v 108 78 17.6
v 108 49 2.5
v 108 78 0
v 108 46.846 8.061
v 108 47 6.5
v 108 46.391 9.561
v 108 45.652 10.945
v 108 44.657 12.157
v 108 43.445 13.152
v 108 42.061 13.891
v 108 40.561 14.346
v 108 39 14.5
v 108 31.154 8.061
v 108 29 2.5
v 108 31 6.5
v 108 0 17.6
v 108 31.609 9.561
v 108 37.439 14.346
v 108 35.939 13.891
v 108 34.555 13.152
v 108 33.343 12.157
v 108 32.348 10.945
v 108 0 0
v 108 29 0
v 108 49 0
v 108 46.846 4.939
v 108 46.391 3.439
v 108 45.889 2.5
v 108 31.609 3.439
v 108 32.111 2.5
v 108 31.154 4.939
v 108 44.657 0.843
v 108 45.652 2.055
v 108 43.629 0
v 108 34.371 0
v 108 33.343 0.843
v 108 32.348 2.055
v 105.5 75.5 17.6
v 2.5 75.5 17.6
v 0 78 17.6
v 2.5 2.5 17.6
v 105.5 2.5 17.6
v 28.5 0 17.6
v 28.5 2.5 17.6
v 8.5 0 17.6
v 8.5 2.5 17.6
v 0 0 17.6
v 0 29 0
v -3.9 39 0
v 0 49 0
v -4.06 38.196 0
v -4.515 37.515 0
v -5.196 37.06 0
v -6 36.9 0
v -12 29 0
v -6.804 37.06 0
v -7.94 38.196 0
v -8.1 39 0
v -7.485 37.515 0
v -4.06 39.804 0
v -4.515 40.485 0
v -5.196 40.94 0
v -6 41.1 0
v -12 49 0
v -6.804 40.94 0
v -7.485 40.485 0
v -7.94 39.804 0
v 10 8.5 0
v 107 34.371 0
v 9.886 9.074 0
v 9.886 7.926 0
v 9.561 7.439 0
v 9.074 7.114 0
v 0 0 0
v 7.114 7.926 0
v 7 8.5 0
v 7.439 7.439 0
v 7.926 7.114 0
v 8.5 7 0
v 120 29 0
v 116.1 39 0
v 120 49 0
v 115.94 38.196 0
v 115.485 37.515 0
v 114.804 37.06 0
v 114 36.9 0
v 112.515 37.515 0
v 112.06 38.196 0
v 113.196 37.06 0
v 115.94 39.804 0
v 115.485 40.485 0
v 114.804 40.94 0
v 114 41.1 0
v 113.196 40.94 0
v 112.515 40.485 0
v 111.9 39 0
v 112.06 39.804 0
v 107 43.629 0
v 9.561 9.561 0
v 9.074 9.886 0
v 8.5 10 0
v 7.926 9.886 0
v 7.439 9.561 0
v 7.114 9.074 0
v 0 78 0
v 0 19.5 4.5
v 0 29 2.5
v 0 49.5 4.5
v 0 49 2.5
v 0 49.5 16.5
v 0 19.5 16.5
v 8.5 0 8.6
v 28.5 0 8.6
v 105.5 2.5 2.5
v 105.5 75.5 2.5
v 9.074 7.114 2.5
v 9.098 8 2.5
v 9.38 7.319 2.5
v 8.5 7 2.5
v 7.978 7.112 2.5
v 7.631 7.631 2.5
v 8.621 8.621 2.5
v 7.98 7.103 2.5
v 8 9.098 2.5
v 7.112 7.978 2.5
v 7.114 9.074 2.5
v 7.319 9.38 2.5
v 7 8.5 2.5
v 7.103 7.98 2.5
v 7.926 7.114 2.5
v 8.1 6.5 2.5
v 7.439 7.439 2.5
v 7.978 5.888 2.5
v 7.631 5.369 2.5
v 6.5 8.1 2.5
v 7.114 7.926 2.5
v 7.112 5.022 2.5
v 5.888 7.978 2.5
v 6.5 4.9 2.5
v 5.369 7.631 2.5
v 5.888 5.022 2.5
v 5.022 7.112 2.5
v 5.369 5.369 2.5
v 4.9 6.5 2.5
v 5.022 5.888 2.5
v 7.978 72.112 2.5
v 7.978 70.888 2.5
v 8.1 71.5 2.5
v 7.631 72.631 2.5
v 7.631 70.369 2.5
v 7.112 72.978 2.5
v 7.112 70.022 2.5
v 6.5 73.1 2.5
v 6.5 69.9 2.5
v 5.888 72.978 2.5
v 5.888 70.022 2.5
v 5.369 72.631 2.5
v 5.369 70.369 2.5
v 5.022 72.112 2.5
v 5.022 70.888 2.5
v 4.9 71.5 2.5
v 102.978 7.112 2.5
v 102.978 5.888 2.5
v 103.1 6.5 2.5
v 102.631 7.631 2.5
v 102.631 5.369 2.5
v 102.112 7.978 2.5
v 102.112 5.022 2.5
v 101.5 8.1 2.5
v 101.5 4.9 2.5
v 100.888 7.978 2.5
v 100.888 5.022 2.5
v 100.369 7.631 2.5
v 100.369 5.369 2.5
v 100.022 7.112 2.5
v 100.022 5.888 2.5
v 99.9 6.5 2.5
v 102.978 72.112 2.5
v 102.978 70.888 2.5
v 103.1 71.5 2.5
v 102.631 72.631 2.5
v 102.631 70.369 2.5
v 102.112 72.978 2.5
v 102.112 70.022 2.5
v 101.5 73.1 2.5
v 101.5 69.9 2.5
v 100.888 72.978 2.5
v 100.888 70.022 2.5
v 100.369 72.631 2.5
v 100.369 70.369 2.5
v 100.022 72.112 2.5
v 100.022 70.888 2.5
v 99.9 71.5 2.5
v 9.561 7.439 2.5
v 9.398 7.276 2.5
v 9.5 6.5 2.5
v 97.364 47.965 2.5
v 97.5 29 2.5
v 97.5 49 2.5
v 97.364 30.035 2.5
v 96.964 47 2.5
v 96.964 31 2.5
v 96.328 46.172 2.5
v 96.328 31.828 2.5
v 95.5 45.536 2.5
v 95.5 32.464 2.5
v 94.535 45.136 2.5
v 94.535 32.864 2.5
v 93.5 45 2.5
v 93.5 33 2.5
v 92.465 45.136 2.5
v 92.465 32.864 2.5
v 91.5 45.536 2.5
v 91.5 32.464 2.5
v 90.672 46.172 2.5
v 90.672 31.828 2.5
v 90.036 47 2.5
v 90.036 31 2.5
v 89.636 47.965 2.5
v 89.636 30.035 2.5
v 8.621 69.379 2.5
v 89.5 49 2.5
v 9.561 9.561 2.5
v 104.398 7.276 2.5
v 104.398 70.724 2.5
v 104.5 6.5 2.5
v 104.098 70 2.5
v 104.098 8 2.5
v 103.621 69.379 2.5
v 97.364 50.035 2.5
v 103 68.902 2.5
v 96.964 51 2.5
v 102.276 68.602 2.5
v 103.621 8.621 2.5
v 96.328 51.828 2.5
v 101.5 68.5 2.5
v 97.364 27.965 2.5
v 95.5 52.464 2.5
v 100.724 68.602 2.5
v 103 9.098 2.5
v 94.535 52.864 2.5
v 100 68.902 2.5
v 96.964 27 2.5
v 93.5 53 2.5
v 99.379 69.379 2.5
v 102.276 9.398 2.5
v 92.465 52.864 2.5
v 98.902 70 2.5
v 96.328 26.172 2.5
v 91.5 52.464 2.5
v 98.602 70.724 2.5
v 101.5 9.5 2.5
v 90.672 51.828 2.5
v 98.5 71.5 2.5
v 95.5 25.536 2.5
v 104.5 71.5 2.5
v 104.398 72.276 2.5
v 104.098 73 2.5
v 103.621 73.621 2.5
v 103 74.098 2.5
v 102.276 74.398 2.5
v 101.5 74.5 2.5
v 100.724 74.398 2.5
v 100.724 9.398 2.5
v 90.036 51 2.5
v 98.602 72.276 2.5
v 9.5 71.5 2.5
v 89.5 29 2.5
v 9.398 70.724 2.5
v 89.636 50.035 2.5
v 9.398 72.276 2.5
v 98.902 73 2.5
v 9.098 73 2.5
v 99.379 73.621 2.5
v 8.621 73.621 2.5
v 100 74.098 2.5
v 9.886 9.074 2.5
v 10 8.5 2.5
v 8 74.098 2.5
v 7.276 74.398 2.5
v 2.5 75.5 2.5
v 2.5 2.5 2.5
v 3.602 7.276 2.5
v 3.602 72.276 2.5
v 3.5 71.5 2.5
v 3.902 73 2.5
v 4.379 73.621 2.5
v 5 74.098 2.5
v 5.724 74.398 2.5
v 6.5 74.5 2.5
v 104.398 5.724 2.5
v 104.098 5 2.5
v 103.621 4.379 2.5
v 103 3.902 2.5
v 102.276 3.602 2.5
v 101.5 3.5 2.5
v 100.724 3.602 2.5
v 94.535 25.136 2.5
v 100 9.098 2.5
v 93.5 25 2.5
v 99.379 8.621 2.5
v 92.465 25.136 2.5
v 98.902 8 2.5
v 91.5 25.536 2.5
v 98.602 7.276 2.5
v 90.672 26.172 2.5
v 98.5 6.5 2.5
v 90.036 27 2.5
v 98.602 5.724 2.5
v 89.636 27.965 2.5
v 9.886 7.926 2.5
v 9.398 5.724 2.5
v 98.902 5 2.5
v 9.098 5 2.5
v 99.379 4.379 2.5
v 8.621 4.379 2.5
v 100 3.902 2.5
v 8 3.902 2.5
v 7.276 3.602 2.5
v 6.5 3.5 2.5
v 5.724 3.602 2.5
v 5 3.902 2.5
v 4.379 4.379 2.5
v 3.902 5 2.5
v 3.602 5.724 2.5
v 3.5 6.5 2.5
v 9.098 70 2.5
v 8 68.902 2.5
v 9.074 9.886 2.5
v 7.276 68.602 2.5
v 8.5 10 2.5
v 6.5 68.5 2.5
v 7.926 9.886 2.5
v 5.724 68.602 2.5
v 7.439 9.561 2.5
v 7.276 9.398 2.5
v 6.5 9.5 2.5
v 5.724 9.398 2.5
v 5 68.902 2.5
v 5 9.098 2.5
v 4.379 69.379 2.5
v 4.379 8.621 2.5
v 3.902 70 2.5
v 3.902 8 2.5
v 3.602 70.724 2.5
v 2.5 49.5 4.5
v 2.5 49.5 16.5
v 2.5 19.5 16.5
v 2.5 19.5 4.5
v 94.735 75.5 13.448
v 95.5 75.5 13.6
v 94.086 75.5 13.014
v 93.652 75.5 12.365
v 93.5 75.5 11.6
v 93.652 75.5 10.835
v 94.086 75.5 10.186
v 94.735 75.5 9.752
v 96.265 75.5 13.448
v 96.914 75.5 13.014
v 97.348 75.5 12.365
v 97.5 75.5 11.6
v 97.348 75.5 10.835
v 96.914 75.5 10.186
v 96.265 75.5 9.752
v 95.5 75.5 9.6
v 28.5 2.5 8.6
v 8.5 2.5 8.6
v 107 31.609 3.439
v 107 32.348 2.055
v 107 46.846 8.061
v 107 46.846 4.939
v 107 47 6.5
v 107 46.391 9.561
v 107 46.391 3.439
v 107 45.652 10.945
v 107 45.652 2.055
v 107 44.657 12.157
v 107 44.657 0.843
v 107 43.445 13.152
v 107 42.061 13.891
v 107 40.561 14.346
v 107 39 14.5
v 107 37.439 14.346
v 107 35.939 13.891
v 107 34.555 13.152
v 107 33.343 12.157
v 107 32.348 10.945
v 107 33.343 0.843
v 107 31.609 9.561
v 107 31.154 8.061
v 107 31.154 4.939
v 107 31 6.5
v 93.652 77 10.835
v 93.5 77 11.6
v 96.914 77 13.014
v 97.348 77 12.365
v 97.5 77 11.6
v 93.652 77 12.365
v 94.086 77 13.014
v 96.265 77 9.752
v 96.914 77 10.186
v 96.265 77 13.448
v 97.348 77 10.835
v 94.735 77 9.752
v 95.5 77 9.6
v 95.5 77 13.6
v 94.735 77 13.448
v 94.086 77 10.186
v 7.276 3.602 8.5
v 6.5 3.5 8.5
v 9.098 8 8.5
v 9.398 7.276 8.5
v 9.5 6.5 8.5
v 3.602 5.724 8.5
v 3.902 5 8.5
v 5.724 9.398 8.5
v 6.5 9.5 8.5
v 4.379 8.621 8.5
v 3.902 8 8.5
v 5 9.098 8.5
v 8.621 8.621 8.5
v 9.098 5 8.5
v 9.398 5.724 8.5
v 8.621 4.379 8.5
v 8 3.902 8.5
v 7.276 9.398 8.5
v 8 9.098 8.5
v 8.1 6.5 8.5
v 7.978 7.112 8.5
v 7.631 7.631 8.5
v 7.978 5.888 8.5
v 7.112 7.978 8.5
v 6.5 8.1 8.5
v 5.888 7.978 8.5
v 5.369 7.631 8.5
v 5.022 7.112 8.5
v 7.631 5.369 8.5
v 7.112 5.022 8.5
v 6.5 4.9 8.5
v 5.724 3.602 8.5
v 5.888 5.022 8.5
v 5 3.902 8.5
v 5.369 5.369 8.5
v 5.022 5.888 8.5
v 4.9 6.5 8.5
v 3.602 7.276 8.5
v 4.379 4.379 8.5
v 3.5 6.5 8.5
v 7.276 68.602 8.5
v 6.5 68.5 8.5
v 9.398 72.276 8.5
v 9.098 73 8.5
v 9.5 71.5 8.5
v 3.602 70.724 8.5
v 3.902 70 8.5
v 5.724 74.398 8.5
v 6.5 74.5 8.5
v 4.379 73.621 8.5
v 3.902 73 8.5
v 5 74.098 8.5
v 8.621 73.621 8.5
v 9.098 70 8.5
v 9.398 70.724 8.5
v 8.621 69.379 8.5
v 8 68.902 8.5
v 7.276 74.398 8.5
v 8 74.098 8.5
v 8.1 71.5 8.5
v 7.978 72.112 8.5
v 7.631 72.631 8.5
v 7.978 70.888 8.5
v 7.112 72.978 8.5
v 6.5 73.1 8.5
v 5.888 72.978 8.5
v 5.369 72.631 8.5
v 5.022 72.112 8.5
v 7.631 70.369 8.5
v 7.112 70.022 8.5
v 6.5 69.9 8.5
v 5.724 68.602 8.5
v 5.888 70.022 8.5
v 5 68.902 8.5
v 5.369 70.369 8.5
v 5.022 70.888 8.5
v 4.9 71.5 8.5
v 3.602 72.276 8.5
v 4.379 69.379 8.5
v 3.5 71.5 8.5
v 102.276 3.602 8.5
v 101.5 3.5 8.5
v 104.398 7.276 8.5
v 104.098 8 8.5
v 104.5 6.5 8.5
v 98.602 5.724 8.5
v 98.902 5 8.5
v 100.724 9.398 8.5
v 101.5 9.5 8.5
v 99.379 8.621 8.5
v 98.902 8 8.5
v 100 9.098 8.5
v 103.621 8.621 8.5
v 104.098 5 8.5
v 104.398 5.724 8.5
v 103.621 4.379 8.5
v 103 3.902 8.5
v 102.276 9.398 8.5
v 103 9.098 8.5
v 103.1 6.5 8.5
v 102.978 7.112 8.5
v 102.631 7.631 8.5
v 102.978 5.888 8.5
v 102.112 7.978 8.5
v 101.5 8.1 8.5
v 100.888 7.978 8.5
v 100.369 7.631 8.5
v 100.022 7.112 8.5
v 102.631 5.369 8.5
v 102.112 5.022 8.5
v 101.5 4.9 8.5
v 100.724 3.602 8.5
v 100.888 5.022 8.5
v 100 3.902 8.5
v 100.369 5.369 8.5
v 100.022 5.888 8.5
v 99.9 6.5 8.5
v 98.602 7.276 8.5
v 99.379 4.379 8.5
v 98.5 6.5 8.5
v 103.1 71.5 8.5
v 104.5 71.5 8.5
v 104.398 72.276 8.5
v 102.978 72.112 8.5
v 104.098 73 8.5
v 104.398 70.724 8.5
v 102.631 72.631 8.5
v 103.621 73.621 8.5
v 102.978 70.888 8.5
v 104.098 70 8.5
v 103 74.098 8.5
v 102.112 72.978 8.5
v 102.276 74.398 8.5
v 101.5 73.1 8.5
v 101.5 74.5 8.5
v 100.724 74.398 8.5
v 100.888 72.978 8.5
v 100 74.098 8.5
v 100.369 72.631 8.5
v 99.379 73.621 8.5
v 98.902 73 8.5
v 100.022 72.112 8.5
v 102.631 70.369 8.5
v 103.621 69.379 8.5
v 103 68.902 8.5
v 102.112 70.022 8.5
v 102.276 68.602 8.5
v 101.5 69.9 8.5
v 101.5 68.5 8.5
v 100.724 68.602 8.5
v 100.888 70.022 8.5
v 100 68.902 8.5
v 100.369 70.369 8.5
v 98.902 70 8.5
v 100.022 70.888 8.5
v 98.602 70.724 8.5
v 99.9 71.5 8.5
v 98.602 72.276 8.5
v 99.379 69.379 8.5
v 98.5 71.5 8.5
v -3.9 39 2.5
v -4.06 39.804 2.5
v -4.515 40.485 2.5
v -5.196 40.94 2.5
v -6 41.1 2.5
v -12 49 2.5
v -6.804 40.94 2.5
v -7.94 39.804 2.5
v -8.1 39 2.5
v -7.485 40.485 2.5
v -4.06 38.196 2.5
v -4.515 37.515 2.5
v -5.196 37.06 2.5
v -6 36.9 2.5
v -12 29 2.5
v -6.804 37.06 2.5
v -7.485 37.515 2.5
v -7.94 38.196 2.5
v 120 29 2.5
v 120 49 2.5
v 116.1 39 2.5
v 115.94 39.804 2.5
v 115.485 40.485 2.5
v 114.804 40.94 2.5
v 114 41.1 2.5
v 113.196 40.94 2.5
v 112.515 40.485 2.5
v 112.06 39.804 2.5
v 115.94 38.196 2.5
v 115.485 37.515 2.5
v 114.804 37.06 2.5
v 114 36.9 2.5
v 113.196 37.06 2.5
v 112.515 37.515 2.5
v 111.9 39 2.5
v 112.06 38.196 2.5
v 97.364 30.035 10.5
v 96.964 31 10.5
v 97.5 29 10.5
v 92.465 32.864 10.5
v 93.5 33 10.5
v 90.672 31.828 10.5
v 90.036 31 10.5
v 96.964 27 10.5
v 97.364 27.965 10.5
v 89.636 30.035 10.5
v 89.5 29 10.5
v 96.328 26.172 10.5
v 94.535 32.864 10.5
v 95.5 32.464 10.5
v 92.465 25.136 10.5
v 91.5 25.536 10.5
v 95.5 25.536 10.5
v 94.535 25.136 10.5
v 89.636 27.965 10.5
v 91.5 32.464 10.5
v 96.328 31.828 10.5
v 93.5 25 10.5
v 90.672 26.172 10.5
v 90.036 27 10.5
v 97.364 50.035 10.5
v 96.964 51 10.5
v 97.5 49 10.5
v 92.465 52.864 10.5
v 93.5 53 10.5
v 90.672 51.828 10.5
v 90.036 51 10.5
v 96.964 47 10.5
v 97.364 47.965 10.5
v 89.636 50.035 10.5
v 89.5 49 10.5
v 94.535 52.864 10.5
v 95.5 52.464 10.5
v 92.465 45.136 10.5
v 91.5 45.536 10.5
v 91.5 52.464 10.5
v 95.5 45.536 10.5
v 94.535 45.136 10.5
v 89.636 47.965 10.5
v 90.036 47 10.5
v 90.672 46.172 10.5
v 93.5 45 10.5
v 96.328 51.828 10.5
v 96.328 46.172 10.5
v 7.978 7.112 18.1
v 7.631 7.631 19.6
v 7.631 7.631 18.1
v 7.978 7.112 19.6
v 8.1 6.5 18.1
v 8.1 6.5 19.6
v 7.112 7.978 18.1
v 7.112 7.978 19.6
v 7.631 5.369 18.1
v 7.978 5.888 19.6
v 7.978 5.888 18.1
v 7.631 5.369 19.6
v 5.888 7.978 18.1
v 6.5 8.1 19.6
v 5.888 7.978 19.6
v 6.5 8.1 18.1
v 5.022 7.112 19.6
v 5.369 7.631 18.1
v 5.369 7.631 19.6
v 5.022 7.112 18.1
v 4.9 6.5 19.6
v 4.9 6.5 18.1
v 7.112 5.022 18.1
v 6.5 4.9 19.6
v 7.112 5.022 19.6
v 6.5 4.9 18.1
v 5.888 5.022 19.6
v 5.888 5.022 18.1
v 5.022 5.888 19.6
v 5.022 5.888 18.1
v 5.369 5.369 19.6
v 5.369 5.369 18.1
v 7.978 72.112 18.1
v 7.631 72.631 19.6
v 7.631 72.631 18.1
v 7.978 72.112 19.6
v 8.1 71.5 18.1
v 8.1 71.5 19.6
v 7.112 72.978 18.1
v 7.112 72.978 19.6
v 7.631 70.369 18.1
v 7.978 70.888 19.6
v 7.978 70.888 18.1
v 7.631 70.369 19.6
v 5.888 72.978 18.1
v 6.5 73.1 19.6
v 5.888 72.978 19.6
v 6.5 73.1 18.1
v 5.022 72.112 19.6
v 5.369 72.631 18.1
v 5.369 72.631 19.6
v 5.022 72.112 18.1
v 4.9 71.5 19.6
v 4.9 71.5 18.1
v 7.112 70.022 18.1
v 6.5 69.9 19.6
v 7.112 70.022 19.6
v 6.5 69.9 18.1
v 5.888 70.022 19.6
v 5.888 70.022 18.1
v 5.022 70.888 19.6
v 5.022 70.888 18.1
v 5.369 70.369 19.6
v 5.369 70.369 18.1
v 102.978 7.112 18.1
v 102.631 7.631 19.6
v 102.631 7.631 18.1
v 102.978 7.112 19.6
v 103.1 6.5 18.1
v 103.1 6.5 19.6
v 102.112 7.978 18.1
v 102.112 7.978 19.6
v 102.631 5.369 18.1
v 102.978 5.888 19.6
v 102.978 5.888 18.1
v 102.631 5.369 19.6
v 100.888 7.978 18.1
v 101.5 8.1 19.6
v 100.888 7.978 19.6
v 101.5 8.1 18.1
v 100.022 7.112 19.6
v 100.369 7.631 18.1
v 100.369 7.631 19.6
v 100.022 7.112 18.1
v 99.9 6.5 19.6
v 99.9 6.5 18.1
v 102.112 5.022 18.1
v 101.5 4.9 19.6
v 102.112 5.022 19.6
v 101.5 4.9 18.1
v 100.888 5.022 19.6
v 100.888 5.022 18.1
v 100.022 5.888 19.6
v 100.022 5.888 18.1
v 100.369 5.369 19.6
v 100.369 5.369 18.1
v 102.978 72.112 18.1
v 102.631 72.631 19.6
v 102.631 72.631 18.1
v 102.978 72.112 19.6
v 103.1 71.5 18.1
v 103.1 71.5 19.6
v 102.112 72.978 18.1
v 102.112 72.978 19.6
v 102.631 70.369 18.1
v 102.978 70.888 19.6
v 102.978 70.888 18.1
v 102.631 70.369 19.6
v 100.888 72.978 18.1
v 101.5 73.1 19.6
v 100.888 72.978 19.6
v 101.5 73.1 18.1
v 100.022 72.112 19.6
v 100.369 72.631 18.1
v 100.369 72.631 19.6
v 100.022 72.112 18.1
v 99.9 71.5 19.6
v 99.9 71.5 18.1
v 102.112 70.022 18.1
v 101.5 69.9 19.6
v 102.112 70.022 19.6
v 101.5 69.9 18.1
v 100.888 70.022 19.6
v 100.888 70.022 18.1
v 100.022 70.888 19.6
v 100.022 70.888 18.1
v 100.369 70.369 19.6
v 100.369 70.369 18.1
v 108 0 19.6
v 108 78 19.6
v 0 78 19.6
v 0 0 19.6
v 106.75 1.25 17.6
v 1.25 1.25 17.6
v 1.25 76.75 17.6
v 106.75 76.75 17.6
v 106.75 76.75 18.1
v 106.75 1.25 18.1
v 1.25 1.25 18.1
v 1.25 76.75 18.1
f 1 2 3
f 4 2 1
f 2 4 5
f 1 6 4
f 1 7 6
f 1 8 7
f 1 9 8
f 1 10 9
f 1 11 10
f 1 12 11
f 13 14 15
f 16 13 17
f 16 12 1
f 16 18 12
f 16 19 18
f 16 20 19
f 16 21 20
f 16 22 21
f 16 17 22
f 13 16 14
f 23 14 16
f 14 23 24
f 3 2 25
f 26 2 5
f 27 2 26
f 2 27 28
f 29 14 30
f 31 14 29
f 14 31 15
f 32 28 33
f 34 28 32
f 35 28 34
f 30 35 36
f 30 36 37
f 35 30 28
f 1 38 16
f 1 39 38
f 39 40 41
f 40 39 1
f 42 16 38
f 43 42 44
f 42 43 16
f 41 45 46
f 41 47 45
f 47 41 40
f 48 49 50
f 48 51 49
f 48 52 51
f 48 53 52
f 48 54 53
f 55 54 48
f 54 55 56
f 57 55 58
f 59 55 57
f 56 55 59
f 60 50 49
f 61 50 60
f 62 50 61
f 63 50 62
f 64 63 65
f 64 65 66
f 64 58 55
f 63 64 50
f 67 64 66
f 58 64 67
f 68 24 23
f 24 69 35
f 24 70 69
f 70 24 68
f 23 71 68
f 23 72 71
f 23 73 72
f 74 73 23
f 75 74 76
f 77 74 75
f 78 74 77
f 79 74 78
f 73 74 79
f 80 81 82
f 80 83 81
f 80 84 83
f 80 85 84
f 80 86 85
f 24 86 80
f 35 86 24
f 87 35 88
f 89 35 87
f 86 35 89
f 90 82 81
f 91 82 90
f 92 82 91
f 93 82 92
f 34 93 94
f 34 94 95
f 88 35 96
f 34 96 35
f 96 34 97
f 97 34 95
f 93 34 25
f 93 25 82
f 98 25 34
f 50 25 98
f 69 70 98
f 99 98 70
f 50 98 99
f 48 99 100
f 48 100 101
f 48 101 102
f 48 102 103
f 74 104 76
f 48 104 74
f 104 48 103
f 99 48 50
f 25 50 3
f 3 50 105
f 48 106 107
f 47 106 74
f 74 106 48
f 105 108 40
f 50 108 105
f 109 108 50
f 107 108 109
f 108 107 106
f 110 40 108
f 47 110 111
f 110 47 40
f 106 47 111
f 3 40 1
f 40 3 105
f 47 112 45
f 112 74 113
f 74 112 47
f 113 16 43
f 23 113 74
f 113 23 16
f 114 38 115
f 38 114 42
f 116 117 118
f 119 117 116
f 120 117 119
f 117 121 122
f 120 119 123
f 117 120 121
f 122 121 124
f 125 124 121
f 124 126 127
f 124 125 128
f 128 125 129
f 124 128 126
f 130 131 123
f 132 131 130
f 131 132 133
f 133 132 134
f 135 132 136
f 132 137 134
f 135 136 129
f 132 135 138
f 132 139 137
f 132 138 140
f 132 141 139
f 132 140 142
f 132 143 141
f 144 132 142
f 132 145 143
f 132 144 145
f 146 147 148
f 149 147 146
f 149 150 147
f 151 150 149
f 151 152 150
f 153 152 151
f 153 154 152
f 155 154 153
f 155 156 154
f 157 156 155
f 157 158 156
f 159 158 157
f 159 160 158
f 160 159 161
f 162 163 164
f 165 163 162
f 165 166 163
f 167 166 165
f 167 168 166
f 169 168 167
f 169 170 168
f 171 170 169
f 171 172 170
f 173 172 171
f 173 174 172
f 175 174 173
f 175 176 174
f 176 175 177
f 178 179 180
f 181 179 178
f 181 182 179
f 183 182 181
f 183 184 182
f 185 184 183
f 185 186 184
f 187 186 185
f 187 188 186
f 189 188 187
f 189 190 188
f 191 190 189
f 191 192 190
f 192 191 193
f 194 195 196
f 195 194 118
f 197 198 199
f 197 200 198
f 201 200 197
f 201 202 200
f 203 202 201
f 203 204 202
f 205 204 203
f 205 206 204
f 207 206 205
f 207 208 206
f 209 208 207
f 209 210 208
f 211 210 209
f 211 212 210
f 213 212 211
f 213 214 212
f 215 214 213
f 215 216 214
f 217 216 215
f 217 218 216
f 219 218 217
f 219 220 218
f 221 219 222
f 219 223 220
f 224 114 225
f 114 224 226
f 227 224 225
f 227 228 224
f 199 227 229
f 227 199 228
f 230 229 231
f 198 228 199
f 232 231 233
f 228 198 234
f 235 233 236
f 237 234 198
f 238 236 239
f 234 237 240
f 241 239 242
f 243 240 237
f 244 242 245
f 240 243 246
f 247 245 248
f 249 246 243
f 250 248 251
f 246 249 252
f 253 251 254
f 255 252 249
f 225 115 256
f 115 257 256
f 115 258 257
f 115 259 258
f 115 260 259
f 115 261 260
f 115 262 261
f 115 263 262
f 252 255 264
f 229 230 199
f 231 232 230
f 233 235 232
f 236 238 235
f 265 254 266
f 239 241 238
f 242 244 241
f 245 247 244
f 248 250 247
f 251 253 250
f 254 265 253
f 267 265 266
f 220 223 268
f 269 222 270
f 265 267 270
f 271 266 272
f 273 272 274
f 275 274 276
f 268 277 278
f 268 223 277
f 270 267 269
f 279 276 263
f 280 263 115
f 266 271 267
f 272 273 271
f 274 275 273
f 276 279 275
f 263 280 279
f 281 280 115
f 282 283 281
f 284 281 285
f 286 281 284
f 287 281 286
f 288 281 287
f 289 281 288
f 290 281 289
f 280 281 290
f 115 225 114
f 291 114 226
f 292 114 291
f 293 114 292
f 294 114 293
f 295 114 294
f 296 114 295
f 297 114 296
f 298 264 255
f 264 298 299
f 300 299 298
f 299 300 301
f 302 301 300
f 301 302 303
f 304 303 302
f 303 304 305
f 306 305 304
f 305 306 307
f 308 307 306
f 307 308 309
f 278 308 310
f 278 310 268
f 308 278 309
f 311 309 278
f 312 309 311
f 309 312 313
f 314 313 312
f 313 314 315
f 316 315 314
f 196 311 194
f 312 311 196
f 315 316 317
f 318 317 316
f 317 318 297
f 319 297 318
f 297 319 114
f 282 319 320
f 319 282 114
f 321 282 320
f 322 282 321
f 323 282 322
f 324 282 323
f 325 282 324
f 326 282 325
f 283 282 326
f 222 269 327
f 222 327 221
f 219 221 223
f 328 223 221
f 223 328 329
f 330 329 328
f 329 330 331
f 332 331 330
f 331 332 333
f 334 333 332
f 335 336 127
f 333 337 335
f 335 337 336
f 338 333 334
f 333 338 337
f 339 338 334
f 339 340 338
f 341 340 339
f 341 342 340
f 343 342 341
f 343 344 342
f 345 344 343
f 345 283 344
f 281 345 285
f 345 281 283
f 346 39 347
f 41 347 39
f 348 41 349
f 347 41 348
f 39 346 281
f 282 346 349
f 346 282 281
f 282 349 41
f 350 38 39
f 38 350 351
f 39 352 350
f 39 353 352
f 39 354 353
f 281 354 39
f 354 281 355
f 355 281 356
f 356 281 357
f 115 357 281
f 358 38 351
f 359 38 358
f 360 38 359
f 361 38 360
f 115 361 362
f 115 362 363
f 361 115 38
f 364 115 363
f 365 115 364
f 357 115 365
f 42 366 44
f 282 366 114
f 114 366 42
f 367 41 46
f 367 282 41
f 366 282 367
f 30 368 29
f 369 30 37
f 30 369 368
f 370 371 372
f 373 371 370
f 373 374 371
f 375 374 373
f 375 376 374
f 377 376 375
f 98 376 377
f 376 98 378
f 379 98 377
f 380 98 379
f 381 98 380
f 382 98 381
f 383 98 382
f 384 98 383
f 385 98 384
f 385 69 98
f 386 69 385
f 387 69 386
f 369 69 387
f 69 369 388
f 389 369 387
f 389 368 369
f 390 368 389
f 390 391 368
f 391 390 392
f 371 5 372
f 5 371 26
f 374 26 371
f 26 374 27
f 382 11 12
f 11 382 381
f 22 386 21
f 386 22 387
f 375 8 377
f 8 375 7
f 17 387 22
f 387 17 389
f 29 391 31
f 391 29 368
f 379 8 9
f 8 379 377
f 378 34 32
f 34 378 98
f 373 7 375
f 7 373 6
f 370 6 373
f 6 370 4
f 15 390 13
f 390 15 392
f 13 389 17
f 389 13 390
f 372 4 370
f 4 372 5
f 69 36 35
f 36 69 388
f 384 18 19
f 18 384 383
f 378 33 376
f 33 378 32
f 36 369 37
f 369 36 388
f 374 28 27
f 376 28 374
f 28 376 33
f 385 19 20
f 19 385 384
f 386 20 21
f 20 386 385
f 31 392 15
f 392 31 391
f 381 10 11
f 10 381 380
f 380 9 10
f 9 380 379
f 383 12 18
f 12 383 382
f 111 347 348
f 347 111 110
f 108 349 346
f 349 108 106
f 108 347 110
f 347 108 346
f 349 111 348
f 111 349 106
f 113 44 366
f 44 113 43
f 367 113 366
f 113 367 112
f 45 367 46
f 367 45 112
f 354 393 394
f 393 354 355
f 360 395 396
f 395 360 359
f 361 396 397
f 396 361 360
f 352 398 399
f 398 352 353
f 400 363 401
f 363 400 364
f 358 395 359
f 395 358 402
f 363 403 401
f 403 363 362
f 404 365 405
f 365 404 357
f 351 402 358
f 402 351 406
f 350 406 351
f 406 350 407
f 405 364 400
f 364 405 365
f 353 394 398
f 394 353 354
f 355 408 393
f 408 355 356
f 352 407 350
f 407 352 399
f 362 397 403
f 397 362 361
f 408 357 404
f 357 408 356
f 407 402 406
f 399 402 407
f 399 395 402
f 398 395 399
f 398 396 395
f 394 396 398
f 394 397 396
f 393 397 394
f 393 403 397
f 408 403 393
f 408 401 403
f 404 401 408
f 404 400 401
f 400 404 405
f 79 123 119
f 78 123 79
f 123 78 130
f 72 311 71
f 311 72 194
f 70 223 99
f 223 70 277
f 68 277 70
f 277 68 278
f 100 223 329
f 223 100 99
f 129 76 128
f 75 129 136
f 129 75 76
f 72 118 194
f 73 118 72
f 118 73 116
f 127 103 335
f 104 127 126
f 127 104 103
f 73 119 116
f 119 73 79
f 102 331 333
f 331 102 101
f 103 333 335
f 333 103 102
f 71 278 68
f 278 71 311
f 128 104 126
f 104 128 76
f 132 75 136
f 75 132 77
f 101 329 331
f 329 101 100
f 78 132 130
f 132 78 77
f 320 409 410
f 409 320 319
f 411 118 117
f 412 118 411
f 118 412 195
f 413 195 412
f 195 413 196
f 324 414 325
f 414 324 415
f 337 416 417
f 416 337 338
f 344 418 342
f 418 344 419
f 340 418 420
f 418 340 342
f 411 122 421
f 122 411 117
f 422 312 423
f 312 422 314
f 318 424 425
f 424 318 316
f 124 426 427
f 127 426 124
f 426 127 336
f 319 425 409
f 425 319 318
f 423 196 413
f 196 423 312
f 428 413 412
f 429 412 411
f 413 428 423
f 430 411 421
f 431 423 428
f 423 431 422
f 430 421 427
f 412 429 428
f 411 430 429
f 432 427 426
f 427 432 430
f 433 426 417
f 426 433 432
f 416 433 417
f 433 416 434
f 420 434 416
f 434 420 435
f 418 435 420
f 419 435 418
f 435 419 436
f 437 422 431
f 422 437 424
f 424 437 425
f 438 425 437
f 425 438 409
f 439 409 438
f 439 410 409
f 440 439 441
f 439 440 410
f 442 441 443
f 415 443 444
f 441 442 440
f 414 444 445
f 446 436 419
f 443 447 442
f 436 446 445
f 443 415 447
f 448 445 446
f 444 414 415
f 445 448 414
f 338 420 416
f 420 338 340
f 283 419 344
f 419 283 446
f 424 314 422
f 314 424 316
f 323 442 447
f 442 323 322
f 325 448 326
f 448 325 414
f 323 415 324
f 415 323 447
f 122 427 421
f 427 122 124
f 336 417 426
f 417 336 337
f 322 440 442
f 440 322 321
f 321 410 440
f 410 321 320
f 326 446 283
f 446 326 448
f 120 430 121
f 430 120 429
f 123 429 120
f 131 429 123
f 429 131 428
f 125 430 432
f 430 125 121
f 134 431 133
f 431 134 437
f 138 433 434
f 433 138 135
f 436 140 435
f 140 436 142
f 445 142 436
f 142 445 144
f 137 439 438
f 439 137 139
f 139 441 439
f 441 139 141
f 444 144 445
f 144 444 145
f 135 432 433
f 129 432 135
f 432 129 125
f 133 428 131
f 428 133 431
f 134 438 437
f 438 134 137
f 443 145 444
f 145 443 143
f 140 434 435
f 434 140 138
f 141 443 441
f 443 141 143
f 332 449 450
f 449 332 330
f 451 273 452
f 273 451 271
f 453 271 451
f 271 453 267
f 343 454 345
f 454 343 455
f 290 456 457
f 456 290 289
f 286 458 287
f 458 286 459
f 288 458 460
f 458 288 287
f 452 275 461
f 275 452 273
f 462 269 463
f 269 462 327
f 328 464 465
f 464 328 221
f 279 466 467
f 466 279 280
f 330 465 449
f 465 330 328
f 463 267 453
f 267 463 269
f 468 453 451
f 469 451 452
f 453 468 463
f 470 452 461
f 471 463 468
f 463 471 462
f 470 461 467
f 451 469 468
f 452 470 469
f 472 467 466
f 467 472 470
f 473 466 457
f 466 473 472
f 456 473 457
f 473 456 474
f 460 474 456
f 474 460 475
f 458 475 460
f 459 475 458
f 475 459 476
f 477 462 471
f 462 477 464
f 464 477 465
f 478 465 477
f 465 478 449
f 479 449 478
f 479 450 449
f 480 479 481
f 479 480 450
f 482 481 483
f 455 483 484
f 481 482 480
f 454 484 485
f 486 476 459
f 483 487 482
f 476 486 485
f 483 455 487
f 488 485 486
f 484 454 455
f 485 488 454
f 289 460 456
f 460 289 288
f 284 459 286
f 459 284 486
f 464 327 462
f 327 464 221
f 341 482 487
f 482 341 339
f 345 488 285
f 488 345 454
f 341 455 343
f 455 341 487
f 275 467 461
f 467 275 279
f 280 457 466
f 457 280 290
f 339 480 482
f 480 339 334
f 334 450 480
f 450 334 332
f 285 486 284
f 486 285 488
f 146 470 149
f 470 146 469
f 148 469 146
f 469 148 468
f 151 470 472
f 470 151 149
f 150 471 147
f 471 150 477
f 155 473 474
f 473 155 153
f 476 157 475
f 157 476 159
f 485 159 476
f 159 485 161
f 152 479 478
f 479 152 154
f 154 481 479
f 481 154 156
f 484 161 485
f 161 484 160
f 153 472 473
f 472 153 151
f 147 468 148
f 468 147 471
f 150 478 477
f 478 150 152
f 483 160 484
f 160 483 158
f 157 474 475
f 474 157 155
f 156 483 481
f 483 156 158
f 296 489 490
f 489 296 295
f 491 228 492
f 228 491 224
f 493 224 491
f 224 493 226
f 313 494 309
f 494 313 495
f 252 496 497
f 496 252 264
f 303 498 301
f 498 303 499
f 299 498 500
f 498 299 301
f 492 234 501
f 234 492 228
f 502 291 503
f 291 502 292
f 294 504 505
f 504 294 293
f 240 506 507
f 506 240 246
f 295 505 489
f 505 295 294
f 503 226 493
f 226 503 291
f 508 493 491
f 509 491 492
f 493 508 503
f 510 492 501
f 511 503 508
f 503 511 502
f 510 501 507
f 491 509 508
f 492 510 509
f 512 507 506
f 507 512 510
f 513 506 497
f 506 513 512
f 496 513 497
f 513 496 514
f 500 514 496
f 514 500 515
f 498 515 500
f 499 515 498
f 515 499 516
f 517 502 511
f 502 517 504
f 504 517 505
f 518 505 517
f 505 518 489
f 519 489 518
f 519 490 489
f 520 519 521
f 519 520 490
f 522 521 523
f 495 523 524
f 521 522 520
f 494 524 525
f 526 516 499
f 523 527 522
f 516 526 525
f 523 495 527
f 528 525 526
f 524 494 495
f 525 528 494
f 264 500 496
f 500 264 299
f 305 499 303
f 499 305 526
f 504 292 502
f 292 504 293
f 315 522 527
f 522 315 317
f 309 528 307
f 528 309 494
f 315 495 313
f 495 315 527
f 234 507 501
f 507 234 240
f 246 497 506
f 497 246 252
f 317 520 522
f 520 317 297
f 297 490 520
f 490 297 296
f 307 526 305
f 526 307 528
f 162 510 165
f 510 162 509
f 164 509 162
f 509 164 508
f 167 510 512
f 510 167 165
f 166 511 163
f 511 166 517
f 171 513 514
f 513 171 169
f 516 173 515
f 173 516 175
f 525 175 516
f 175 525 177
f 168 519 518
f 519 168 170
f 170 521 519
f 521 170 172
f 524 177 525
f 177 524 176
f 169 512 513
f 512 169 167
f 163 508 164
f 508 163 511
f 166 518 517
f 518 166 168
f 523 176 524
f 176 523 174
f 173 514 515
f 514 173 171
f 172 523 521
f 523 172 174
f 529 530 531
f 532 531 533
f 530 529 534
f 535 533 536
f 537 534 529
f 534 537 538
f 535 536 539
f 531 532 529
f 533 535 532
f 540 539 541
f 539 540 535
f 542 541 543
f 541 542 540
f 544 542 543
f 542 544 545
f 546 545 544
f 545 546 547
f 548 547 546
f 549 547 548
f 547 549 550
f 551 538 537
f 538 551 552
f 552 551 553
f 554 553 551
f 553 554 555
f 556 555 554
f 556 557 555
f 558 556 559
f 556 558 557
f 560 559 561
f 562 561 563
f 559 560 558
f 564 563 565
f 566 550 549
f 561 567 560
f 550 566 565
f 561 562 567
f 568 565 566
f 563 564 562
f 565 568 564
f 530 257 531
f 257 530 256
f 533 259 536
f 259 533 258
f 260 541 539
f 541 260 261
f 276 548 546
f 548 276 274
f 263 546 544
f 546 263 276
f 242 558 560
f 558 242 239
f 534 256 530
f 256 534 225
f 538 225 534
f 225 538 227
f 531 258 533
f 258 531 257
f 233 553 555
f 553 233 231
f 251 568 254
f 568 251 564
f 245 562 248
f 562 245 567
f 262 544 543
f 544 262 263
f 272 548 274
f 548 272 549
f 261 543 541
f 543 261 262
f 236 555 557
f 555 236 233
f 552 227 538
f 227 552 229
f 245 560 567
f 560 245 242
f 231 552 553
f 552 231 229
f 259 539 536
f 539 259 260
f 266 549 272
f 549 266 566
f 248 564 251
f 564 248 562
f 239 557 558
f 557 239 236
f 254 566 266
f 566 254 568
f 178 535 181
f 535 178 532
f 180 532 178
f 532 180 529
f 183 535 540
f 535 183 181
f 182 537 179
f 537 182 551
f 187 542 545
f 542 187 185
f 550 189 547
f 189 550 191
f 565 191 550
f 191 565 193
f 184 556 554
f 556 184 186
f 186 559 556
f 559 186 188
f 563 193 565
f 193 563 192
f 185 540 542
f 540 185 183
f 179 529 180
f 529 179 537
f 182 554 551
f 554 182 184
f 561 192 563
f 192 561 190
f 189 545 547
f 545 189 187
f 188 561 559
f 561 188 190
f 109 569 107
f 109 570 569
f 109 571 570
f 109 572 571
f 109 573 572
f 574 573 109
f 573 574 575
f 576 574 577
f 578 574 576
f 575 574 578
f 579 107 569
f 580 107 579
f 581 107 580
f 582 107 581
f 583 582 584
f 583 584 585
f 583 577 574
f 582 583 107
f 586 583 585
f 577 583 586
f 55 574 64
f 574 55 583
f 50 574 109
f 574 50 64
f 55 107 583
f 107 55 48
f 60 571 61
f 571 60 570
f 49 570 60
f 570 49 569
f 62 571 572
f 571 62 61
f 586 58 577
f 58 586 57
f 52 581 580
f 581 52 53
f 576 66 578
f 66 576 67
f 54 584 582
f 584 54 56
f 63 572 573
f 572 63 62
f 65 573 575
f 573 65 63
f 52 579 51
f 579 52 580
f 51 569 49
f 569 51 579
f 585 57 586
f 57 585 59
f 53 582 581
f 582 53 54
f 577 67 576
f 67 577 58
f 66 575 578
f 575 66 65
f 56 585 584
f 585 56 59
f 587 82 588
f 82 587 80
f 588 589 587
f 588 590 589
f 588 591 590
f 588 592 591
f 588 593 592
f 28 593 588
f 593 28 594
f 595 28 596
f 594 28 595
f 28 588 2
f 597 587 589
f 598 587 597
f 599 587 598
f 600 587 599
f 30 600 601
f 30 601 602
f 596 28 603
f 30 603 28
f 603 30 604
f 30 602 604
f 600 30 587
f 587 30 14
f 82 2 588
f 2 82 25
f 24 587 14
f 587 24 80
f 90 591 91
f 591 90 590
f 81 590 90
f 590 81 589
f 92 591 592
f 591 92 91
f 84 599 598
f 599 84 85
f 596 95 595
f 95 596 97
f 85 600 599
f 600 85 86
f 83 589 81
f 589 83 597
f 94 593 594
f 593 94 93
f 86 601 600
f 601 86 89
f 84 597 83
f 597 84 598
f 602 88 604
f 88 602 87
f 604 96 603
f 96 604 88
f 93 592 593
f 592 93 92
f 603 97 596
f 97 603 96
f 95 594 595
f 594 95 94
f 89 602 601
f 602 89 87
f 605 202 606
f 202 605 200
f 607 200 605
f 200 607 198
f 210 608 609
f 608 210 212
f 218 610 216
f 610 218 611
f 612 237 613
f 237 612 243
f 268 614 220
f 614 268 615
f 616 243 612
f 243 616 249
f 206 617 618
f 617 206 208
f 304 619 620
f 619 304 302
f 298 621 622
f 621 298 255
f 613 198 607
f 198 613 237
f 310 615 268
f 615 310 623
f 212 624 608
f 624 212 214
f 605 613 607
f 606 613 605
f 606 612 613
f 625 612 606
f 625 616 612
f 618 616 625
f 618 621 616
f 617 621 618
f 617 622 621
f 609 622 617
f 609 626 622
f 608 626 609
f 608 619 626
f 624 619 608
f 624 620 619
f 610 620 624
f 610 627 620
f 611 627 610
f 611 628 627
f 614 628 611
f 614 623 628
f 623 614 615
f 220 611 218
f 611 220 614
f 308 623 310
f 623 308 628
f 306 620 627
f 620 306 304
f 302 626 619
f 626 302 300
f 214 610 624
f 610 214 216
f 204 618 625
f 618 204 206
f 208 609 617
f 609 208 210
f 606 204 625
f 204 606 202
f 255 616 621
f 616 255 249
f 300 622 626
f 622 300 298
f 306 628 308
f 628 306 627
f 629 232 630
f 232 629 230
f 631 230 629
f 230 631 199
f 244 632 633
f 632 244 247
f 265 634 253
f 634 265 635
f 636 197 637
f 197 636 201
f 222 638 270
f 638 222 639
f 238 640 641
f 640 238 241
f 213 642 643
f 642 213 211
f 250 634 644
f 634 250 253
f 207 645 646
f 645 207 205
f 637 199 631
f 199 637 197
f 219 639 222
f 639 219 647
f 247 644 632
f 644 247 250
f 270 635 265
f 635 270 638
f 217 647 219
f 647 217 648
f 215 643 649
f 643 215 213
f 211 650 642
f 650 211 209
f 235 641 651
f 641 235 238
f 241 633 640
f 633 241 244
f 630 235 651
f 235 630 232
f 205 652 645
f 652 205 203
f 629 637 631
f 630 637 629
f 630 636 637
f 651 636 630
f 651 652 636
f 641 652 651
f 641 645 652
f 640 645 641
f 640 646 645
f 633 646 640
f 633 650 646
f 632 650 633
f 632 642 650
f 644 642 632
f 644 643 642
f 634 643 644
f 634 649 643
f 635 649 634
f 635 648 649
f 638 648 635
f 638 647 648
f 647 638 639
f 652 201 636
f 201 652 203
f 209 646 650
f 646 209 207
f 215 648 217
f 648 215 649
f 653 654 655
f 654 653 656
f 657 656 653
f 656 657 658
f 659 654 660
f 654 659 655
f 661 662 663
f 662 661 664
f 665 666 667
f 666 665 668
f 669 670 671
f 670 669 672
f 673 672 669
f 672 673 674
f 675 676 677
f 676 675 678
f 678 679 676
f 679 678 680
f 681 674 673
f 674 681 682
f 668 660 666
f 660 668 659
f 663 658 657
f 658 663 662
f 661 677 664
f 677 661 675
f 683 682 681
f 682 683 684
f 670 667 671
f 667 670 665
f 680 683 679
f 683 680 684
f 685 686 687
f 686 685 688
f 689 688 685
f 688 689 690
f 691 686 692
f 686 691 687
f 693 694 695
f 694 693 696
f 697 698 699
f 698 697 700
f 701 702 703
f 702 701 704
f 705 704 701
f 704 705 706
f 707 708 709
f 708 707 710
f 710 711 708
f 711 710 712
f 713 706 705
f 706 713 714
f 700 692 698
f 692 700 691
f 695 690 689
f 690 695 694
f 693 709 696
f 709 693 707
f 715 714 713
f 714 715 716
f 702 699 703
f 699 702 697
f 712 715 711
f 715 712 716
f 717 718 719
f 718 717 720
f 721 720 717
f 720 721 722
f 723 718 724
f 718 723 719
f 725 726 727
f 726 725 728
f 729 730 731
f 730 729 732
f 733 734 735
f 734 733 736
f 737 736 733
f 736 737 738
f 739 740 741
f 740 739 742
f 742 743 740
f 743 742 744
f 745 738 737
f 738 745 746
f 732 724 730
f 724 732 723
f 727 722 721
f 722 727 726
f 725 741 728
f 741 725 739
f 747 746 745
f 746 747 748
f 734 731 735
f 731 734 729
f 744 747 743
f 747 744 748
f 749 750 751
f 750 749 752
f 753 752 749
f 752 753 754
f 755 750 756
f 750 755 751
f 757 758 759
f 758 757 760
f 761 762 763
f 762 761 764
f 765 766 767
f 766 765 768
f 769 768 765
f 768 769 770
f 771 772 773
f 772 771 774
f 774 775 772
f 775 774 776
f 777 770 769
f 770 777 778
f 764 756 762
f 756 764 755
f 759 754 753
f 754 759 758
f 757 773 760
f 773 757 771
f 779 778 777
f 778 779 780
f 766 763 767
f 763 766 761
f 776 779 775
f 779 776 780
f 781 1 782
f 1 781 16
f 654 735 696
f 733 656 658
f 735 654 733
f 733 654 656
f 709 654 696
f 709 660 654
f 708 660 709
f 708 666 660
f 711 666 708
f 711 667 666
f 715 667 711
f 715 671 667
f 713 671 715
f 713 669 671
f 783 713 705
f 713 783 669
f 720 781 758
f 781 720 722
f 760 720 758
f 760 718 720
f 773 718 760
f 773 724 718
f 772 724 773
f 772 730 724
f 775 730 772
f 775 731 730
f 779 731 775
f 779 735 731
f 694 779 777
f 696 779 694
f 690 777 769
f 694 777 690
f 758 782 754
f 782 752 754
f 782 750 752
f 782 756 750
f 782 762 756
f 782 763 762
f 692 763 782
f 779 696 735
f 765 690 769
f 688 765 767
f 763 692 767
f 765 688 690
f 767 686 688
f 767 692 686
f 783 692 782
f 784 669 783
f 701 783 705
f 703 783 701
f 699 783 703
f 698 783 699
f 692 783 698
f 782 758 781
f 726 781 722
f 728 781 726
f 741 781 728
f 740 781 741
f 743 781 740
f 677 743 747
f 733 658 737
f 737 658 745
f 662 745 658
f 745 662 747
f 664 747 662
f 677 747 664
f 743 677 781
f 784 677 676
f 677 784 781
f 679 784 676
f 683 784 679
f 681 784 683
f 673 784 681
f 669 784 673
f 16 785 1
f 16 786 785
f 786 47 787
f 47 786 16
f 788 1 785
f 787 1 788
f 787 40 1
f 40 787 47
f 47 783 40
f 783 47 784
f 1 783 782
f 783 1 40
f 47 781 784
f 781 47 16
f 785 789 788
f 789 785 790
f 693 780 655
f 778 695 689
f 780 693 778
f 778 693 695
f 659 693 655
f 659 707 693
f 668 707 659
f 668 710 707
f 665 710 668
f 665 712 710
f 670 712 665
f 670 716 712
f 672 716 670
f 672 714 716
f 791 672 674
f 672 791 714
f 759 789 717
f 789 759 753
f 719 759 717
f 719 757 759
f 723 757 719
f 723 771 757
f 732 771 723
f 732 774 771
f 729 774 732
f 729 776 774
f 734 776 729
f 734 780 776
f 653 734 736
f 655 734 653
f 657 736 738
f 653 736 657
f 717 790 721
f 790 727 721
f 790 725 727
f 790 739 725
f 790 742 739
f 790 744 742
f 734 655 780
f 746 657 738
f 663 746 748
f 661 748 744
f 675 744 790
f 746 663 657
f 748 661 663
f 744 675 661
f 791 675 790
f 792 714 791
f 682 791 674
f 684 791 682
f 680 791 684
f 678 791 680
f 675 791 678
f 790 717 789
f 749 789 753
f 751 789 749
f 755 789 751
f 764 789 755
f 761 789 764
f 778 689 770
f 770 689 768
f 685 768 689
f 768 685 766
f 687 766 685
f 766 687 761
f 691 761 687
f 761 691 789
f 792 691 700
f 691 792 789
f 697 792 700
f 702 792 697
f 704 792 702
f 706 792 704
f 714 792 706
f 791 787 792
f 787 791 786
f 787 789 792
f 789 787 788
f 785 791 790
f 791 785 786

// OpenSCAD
// SPDX-License-Identifier: GPL-3.0-or-later
// Parametric enclosure for the NA wink controller (prototype intent).
// Prototype material (ASA/ABS print) ONLY - NOT automotive-qualified.
// See docs/SAFETY_CASE.md for thermal / moisture / vibration limits.
// Validate with: parser check in scripts/verify.sh (mesh render needs OpenSCAD).
//
// Contents: PCB mounting (4x M3 bosses + inserts), relay clearance dome,
// connector clearance cutouts (J1/J2/J3), cable exits (16 mm gland + boots),
// internal strain-relief posts, chassis mounting ears, tilt drain, service
// lid with fasteners, status-LED window (DEFERRED/NON-FUNCTIONAL in rev 0.3.1:
// no LED in BOM/schematic — do NOT rely on it), fuse-access hatch (service
// disconnect without opening the case).
//
// Placement: cabin/footwell REQUIRED (never engine bay). Connectors DOWN
// (drip). Fuse holder reachable from outside.
// Print: ASA/ABS, 0.2 mm layers, 4 walls, 40% gyroid (prototype only).

// --- Parameters (mm) ---
pcb_l = 100; pcb_w = 70; pcb_t = 1.6;
wall = 2.5; lid_t = 2.0; clearance_xy = 1.5; clearance_z = 8;
boss_d = 6.0; boss_hole_d = 3.2;           // M3 self-tap / insert
gland_d = 16.0;                             // cable gland entry
drain_d = 3.0;                              // tongue-and-groove tilt drain corner
strain_post_d = 8.0;
relay_dome_h = 6.0;                         // extra clearance over K1-K4 bank
conn_cut_w = 30.0; conn_cut_h = 12.0;       // J1/J2/J3 face cutouts
ear_w = 12.0; ear_hole_d = 4.2;             // M4 chassis ears
led_win_d = 4.0;                            // deferred LED window (NON-FUNCTIONAL rev 0.3.1 — geometry kept, no LED fitted)
fuse_hatch_w = 20.0; fuse_hatch_h = 14.0;   // F1 service hatch
lid_screw_d = 3.2; lid_insert_d = 4.0;      // M3 lid screws + inserts

inner_l = pcb_l + 2*clearance_xy;
inner_w = pcb_w + 2*clearance_xy;
outer_l = inner_l + 2*wall;
outer_w = inner_w + 2*wall;
base_h = clearance_z + pcb_t + 6;           // room for relays + buck inductor

module body() {
  difference() {
    // outer body
    cube([outer_l, outer_w, base_h + lid_t], center=false);
    // cavity
    translate([wall, wall, wall])
      cube([inner_l, inner_w, base_h + lid_t], center=false);
    // relay clearance dome (over K1-K4 bank, center-right of PCB)
    translate([outer_l*0.35, outer_w*0.45, base_h - relay_dome_h])
      cube([outer_l*0.5, outer_w*0.4, relay_dome_h + lid_t + 1], center=false);
    // cable entry (gland side, +X face)
    translate([outer_l - 1, outer_w/2, wall + 4])
      rotate([0, 90, 0])
      cylinder(d=gland_d, h=wall + 2, $fn=32);
    // connector face cutouts (J1/J2/J3 edge, -X face)
    translate([-1, outer_w*0.25, wall + 2])
      cube([wall + 2, conn_cut_w, conn_cut_h], center=false);
    // fuse service hatch (top edge near F1 corner)
    translate([wall + 6, -1, base_h - fuse_hatch_h/2])
      cube([fuse_hatch_w, wall + 2, fuse_hatch_h], center=false);
    // deferred status-LED window (lid-adjacent wall; NON-FUNCTIONAL rev 0.3.1)
    translate([wall + inner_l - 10, outer_w - 1, base_h - 4])
      rotate([90, 0, 0])
      cylinder(d=led_win_d, h=wall + 2, $fn=16);
    // tilt drain at -X/-Y corner
    translate([wall + 6, wall + 6, -0.5])
      cylinder(d=drain_d, h=wall + 1, $fn=16);
    // lid screw counterbores x4
    for (x = [wall + 4, wall + inner_l - 4])
      for (y = [wall + 4, wall + inner_w - 4])
        translate([x, y, base_h + lid_t - 1])
          cylinder(d=lid_screw_d + 1.6, h=2, $fn=16);
  }
  // PCB bosses x4 (M3 inserts)
  for (x = [wall + 4, wall + inner_l - 4])
    for (y = [wall + 4, wall + inner_w - 4])
      difference() {
        translate([x, y, wall]) cylinder(d=boss_d, h=6, $fn=24);
        translate([x, y, wall]) cylinder(d=boss_hole_d, h=7, $fn=16);
      }
  // strain-relief posts near gland
  translate([outer_l - wall - 12, outer_w/2 - 10, wall])
    cylinder(d=strain_post_d, h=8, $fn=24);
  translate([outer_l - wall - 12, outer_w/2 + 10, wall])
    cylinder(d=strain_post_d, h=8, $fn=24);
  // chassis mounting ears x2 (-X/+X)
  for (sx = [-ear_w, outer_l])
    difference() {
      translate([sx, outer_w/2 - 10, 0]) cube([ear_w, 20, wall], center=false);
      translate([sx + ear_w/2, outer_w/2, -0.5])
        cylinder(d=ear_hole_d, h=wall + 1, $fn=16);
    }
}

module lid() {
  translate([0, 0, base_h + lid_t]) {
    difference() {
      cube([outer_l, outer_w, lid_t], center=false);
      // tongue-and-groove channel (mating ridge on body implied)
      translate([wall/2, wall/2, -1])
        cube([outer_l - wall, outer_w - wall, 1.5], center=false);
      // lid screw through-holes x4 (match body counterbores)
      for (x = [wall + 4, wall + inner_l - 4])
        for (y = [wall + 4, wall + inner_w - 4])
          translate([x, y, -0.5])
            cylinder(d=lid_screw_d, h=lid_t + 1, $fn=16);
    }
  }
}

body();
lid();

// echo key dims for verify.sh parser check
echo(str("OUTER ", outer_l, " x ", outer_w, " x ", base_h + lid_t));
echo(str("NOT automotive-qualified - prototype ASA/ABS only"));
